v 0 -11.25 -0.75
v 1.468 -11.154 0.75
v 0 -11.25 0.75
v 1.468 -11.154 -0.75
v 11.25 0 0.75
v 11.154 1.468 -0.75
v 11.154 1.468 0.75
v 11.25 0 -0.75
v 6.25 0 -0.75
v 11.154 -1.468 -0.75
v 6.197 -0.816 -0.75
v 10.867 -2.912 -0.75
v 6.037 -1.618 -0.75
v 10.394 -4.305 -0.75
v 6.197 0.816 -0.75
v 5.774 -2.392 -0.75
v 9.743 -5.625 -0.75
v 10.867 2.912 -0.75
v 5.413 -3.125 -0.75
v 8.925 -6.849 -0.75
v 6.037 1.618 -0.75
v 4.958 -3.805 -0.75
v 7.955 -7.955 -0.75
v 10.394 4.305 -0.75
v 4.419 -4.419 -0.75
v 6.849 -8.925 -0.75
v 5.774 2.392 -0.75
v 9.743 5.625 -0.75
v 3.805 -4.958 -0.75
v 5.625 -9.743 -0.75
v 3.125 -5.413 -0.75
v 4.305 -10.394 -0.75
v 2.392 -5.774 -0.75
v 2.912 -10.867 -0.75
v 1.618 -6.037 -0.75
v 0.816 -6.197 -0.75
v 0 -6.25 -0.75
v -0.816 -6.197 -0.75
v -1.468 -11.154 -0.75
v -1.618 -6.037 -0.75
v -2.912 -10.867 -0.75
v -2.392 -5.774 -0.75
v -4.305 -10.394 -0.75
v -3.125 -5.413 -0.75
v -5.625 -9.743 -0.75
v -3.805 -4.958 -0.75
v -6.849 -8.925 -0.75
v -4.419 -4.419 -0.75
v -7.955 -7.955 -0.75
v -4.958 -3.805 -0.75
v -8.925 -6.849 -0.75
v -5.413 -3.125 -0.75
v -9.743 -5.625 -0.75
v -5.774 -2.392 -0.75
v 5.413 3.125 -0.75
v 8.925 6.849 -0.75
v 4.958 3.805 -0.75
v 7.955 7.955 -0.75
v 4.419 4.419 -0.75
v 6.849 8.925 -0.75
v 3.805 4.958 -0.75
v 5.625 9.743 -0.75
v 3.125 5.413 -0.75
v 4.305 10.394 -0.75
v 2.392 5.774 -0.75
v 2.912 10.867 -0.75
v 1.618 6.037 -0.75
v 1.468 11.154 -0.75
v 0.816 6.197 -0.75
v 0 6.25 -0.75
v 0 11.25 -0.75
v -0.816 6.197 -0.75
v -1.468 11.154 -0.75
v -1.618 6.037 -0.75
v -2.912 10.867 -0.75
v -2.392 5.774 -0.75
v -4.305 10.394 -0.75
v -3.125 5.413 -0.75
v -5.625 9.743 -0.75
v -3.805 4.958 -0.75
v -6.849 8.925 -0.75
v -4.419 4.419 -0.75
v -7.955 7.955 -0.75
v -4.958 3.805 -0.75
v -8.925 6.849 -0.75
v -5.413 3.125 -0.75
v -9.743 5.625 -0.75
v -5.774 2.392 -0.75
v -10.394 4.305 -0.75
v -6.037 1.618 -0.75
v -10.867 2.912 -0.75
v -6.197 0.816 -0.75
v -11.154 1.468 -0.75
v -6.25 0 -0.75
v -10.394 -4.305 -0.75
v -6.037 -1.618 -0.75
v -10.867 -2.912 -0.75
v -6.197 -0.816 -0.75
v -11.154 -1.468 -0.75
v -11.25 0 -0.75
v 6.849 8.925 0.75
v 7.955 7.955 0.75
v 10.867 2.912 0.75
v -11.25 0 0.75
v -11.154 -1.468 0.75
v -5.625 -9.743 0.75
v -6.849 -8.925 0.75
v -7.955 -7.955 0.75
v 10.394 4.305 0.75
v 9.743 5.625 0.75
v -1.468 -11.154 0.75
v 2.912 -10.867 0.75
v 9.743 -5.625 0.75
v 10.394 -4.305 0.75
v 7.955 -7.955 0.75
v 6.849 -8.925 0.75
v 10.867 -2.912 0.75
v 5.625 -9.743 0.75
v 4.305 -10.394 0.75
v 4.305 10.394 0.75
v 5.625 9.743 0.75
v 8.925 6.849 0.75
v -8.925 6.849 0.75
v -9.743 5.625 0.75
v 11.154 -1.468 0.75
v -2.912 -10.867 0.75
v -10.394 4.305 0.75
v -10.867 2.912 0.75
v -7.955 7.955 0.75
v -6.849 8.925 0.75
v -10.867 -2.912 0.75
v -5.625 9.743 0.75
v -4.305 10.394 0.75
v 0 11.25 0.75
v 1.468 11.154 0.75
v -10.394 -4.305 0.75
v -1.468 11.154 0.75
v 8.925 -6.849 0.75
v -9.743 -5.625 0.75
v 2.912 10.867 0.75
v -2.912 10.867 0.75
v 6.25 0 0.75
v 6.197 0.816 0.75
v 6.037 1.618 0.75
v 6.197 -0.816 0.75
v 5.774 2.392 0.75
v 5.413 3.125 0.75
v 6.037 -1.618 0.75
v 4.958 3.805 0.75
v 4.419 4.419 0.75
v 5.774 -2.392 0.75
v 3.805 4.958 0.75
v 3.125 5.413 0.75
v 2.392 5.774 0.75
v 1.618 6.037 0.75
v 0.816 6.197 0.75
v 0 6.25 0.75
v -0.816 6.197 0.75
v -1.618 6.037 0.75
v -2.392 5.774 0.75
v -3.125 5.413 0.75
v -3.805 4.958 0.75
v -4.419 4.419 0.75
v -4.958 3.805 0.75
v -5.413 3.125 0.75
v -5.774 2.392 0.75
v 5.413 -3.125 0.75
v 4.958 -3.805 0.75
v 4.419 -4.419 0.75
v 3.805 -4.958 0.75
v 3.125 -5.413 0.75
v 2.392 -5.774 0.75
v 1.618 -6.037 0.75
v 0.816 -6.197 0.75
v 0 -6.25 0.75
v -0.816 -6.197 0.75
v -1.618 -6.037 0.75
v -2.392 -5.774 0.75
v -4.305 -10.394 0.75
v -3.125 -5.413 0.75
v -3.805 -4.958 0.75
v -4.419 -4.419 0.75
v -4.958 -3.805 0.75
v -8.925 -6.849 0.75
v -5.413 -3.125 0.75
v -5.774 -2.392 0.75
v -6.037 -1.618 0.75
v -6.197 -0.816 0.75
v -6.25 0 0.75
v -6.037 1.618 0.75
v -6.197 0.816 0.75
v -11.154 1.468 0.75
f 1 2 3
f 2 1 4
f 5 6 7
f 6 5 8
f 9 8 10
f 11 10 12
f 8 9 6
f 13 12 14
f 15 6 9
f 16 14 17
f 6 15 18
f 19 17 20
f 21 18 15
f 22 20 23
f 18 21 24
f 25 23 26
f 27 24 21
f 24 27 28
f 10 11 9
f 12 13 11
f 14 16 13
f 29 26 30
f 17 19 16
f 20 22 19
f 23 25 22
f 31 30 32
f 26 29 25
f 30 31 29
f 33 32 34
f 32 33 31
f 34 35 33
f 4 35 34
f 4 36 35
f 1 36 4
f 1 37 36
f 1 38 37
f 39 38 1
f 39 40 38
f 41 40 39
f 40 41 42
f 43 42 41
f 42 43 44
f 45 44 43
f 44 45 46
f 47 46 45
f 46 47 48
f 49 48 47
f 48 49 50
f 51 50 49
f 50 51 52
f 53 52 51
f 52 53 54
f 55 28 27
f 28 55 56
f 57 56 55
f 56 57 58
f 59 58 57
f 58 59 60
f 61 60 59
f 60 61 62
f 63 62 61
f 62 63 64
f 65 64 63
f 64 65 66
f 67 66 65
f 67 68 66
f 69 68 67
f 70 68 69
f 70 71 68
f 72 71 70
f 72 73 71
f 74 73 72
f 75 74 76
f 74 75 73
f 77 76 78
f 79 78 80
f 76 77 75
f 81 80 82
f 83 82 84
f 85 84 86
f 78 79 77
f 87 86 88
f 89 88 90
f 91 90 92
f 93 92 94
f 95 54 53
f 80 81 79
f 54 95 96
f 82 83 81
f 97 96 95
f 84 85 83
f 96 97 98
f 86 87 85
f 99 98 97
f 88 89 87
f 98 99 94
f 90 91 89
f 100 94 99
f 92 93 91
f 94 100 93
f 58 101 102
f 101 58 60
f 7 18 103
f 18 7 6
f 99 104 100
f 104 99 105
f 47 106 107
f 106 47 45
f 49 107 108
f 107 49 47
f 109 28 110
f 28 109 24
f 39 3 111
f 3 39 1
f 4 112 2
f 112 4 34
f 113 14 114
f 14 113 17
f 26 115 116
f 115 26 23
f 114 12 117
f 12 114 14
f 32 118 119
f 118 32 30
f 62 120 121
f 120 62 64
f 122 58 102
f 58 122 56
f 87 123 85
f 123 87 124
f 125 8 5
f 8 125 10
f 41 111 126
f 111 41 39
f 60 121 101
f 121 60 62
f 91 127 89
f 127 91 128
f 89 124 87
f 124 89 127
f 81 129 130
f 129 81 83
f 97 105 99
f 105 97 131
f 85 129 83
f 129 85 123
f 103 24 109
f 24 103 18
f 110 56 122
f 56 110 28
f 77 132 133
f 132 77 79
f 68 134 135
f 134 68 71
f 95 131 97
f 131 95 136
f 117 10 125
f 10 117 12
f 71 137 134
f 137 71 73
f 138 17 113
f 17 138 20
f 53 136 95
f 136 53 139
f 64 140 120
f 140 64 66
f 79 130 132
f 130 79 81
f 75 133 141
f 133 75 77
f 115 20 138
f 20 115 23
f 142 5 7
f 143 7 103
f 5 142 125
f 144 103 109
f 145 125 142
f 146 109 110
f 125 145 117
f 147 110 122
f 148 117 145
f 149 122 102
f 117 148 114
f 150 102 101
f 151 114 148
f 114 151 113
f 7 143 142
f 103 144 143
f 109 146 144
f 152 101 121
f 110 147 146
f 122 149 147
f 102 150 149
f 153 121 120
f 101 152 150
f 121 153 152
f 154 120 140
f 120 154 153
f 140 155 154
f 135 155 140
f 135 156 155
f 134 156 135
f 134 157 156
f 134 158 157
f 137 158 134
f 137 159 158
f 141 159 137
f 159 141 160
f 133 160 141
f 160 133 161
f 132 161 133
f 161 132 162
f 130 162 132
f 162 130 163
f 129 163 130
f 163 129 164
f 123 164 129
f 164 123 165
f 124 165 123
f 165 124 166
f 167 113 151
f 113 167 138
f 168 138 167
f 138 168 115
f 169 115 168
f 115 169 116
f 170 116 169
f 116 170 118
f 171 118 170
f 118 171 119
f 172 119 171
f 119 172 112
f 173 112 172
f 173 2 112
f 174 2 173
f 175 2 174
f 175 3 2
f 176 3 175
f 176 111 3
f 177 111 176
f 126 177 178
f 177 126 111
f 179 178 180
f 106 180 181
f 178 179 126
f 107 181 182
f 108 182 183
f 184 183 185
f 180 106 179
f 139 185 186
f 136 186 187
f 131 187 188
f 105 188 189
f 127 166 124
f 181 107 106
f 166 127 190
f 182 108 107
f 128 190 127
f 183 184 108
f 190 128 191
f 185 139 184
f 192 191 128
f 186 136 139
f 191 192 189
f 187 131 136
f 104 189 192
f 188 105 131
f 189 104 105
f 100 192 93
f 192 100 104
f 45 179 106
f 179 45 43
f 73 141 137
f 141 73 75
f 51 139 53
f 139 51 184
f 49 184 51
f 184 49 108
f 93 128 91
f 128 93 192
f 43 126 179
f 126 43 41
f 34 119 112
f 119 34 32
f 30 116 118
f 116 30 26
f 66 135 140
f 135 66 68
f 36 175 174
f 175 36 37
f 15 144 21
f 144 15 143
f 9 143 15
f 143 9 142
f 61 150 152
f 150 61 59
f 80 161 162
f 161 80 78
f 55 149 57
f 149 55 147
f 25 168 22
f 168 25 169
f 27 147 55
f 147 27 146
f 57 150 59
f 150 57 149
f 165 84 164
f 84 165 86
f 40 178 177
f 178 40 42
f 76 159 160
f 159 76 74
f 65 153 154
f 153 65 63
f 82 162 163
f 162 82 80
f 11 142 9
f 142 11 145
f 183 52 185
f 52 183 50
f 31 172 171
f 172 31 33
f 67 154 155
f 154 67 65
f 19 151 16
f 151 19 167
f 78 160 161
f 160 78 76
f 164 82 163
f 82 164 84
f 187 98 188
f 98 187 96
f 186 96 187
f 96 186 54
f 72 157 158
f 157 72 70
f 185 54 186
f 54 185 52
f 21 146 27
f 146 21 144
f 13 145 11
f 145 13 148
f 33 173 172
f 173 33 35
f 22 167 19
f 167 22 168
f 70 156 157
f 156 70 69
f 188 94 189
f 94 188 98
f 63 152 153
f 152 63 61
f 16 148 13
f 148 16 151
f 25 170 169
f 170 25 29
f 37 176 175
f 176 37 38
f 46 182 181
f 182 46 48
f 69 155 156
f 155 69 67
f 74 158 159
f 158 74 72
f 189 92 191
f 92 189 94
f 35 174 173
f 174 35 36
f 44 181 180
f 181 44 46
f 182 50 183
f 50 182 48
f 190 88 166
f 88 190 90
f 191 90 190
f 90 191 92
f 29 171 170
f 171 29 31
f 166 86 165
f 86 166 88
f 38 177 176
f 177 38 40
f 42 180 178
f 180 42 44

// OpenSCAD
wall=1.5;
id=12.5;
od=12.5 + 5*2;
$fn=48;

count=1;

washers(count);

module washers(count=1) {
  slot_w = od+1;
  start_x = count/2 * -slot_w;
  for(i=[0:count-1]) {
      x = start_x + slot_w/2 + i * slot_w;
      translate([x,0,0]) difference() {
        cylinder(d=od, h=wall, center=true);
        cylinder(d=id, h=wall*1.01, center=true);
      }
  }
}
